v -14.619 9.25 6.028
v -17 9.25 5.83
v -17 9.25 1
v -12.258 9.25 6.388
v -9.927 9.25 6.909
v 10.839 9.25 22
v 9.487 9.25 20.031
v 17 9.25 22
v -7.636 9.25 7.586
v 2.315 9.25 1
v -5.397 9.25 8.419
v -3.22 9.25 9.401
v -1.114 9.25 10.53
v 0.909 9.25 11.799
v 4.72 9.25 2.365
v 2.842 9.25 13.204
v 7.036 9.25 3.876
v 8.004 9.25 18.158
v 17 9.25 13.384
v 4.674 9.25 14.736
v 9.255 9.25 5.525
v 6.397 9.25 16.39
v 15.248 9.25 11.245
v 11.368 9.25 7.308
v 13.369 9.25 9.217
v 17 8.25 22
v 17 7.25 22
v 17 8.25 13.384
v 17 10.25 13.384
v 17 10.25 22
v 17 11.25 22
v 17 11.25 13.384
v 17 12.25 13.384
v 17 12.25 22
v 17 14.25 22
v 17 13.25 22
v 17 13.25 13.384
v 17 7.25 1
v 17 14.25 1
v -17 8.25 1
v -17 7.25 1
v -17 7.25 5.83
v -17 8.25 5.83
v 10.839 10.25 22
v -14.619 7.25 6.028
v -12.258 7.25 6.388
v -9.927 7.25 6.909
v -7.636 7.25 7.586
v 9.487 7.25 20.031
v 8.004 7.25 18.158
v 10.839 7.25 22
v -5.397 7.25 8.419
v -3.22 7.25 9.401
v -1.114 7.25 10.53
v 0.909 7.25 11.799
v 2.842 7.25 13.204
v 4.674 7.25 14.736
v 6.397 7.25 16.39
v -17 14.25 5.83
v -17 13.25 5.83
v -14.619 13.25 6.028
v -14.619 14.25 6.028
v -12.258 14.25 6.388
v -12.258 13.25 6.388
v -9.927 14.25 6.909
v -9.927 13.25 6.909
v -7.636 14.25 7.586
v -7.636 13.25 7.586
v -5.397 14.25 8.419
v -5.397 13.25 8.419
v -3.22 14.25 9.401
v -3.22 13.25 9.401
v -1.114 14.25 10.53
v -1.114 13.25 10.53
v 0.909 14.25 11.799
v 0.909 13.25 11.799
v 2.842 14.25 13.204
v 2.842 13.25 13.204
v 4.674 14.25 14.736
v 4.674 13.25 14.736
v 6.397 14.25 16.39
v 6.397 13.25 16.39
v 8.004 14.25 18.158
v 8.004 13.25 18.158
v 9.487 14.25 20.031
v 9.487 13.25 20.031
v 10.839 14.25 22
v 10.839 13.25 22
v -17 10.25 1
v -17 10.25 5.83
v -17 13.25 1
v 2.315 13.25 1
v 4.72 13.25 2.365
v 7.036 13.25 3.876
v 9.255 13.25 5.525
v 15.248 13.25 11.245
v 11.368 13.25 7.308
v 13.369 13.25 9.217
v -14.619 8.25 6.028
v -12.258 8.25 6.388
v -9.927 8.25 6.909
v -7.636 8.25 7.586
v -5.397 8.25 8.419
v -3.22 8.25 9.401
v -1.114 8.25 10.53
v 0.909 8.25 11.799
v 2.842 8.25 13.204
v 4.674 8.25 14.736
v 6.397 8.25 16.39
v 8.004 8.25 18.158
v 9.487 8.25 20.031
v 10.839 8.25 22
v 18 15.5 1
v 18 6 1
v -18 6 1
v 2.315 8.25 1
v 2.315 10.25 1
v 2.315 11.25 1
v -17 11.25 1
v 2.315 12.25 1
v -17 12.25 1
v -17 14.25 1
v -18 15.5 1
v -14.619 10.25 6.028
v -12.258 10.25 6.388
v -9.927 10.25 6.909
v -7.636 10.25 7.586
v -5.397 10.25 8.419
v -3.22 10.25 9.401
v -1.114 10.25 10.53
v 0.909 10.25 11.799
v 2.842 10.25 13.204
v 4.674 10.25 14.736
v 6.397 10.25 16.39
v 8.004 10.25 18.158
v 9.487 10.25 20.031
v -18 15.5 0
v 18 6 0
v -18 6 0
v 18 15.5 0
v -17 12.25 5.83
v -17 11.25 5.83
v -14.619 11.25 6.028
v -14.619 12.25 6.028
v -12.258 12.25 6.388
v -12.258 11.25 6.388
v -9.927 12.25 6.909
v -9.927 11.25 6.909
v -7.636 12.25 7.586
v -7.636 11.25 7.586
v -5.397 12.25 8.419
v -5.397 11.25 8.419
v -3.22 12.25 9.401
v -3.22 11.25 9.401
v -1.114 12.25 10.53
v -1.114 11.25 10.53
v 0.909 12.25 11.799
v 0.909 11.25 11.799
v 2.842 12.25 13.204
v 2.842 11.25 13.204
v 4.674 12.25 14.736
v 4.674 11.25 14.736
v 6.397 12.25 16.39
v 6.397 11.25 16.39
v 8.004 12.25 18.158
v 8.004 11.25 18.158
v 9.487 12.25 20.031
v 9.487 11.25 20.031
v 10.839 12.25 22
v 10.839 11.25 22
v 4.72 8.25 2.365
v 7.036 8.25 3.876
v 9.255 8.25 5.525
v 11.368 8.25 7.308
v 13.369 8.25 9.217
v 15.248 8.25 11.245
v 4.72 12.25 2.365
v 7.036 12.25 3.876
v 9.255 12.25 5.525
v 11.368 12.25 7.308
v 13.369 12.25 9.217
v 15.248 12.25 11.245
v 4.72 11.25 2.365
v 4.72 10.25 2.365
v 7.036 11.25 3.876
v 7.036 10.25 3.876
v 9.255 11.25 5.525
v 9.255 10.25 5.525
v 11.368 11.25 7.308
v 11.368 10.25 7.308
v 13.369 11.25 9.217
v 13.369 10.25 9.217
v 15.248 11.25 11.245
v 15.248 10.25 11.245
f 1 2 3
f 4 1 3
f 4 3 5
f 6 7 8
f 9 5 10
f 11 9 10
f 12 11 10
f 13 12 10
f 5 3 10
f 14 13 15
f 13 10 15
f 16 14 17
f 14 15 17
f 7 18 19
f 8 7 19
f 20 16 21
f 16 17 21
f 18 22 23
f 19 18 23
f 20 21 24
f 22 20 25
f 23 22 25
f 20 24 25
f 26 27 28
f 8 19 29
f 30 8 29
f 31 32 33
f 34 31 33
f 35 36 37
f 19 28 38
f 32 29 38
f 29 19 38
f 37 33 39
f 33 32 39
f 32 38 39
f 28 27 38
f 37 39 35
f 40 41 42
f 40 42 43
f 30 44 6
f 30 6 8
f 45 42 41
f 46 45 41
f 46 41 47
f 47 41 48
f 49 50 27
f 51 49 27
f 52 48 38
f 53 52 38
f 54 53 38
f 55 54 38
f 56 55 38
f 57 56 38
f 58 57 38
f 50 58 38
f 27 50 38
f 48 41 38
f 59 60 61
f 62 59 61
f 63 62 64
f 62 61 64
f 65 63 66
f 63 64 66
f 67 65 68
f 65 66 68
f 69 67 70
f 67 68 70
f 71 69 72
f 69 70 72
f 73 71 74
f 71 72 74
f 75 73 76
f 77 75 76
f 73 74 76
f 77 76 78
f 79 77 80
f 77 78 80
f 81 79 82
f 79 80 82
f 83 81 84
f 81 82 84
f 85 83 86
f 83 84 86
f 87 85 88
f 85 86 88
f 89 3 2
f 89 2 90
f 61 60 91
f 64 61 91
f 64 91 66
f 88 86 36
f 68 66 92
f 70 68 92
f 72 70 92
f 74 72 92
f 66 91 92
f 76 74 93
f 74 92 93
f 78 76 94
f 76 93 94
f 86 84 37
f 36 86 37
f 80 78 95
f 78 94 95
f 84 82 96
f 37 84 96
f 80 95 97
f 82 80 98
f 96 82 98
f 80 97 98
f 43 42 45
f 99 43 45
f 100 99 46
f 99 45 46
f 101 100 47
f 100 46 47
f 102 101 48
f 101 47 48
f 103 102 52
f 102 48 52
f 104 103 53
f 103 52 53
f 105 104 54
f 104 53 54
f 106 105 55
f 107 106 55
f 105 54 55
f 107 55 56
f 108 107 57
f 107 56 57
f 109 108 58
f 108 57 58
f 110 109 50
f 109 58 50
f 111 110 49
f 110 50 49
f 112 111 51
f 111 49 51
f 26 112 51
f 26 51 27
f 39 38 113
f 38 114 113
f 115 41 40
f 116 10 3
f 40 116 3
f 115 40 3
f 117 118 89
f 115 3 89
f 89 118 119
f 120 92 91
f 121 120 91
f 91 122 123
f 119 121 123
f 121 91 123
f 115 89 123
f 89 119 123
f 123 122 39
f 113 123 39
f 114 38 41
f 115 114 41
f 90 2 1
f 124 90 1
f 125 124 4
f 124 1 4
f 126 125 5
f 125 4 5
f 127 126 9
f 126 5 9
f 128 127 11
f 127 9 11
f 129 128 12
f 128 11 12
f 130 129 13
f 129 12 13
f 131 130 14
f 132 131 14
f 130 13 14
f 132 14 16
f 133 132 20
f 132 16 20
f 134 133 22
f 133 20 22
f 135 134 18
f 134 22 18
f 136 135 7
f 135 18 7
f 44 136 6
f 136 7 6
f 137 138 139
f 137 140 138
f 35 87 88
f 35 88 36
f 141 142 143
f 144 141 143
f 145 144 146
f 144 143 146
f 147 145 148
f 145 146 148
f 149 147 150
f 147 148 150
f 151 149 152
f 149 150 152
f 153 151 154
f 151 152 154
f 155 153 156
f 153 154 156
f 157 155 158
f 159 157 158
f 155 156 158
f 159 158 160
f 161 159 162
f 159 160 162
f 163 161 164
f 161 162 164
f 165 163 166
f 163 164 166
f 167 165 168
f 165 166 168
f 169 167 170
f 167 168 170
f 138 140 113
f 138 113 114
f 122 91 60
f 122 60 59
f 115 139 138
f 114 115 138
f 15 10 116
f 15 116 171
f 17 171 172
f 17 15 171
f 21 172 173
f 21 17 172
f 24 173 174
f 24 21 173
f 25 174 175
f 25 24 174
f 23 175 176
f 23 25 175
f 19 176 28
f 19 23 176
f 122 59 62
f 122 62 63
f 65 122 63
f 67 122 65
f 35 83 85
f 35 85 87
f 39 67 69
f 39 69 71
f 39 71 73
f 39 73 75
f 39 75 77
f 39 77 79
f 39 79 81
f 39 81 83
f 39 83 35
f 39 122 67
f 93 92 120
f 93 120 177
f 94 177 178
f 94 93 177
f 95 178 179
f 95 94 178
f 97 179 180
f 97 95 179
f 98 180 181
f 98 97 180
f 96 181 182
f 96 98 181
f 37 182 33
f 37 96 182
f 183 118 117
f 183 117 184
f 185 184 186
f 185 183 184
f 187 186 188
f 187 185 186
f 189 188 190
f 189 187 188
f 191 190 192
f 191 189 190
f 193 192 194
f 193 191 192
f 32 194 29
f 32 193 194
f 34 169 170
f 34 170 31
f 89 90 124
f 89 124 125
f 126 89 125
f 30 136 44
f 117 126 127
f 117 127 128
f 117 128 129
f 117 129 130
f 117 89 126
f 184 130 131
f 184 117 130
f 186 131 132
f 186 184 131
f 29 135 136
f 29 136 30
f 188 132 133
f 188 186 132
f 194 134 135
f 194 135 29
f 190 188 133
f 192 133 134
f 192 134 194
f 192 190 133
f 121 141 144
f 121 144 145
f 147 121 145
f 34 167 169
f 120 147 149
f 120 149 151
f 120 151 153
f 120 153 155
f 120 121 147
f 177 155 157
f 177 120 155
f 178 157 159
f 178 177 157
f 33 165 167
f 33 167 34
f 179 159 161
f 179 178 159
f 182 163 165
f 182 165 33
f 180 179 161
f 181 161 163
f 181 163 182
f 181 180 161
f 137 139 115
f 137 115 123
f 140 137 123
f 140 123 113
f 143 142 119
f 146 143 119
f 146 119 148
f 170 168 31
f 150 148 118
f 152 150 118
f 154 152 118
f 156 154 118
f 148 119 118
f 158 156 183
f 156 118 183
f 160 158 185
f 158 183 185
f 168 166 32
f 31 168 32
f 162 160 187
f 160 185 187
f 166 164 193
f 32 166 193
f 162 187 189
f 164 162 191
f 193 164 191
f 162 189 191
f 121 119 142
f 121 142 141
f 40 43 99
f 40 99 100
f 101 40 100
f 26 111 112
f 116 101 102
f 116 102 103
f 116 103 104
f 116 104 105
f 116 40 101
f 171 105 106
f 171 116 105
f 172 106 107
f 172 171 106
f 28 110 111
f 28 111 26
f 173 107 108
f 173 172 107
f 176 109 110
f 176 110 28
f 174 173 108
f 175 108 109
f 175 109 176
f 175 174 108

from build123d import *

# Parameters (mm, degrees)
SKETCH2_W               = 34
SKETCH2_H               = 1
EXTRUDE1_DEPTH          = 22
EXTRUDE1_2_DEPTH        = 22
EXTRUDE1_3_DEPTH        = 22
EXTRUDE1_4_DEPTH        = 22
CUT_EXTRUDE1_DEPTH      = 29.670542374
CUT_EXTRUDE1_DEPTH_BACK = 29.670542374
EXTRUDE2_DEPTH          = 1
EXTRUDE3_REACH          = 31.598


with BuildPart() as part:
    # Sketch2 → Extrude1 (new body)
    with BuildSketch(Plane.XY):
        with Locations((0, 13.75)):
            Rectangle(SKETCH2_W, SKETCH2_H)
    extrude(amount=EXTRUDE1_DEPTH)


with BuildPart() as body_2:
    # Sketch2 → Extrude1 2 (new body)
    with BuildSketch(Plane.XY):
        with Locations((0, 11.75)):
            Rectangle(SKETCH2_W, SKETCH2_H)
    extrude(amount=EXTRUDE1_2_DEPTH)


with BuildPart() as body_3:
    # Sketch2 → Extrude1 3 (new body)
    with BuildSketch(Plane.XY):
        with Locations((0, 9.75)):
            Rectangle(SKETCH2_W, SKETCH2_H)
    extrude(amount=EXTRUDE1_3_DEPTH)


with BuildPart() as body_4:
    # Sketch2 → Extrude1 4 (new body)
    with BuildSketch(Plane.XY):
        with Locations((0, 7.75)):
            Rectangle(SKETCH2_W, SKETCH2_H)
    extrude(amount=EXTRUDE1_4_DEPTH)


with BuildPart() as cut_extrude1_tool:
    # Sketch3 → Cut-Extrude1 (new, two sides: drawn at the far end of the back side and taken through both)
    with BuildSketch(Plane(origin=(0, 14.25, 0), x_dir=(1, 0, 0), z_dir=(0, 1, 0)).offset(-CUT_EXTRUDE1_DEPTH_BACK)):
        with BuildLine():
            Line((-102.195874551, -1.64205818), (-17, -5.829814285))
            ThreePointArc((-17, -5.829814285), (-1.114330758, -10.529941826), (10.839055861, -22))
            Line((10.839055861, -22), (56.687802572, -93.928900776))
            Line((56.687802572, -93.928900776), (-28.997329883, -241.446884233))
            Line((-28.997329883, -241.446884233), (-187.881007007, -149.160041637))
            Line((-187.881007007, -149.160041637), (-102.195874551, -1.64205818))
        make_face()
    extrude(amount=CUT_EXTRUDE1_DEPTH + CUT_EXTRUDE1_DEPTH_BACK)


with BuildPart() as part_1:
    add(part.part)

    # Cut-Extrude1: cut by cut_extrude1_tool
    add(cut_extrude1_tool.part, mode=Mode.SUBTRACT)



with BuildPart() as body_2_1:
    add(body_2.part)

    # Cut-Extrude1: cut by cut_extrude1_tool
    add(cut_extrude1_tool.part, mode=Mode.SUBTRACT)


with BuildPart() as body_3_1:
    add(body_3.part)

    # Cut-Extrude1: cut by cut_extrude1_tool
    add(cut_extrude1_tool.part, mode=Mode.SUBTRACT)


with BuildPart() as body_4_1:
    add(body_4.part)

    # Cut-Extrude1: cut by cut_extrude1_tool
    add(cut_extrude1_tool.part, mode=Mode.SUBTRACT)


with BuildPart() as part_2:
    add(part_1.part)

    add(body_2_1.part)  # Extrude2 merges body 2

    add(body_3_1.part)  # Extrude2 merges body 3

    add(body_4_1.part)  # Extrude2 merges body 4
    # Sketch1 → Extrude2 (add)
    with BuildSketch(Plane.XY):
        Polygon((-16, 6), (-18, 6), (-18, 15.5), (18, 15.5), (18, 6), (16, 6), align=None)
    extrude(amount=EXTRUDE2_DEPTH)

    # Extrude3: up to this face of the body (flat: up to its plane)
    extrude3_end = Plane(part_2.part.faces().sort_by_distance((4.784093831, 7.25, 8.43063068))[0])
    # Sketch4 → Extrude3 (add, up to the picked face)
    with BuildSketch(Plane(origin=(0, 14.25, 0), x_dir=(1, 0, 0), z_dir=(0, 1, 0)), mode=Mode.PRIVATE) as extrude3_sk1:
        with BuildLine():
            Line((17, -13.384444495), (17, -1))
            Line((17, -1), (2.315156907, -1))
            ThreePointArc((2.315156907, -1), (10.32529612, -6.40047667), (17, -13.384444495))
        make_face()
    extrude3_tool1 = split(extrude(extrude3_sk1.sketch, amount=-EXTRUDE3_REACH, mode=Mode.PRIVATE), bisect_by=extrude3_end, keep=Keep.BOTH, mode=Mode.PRIVATE)
    add(extrude3_tool1.solids().sort_by(Axis((12.478382, 14.25, 4.828977), (0, -1, 0)))[0])


solid = part_2.part
